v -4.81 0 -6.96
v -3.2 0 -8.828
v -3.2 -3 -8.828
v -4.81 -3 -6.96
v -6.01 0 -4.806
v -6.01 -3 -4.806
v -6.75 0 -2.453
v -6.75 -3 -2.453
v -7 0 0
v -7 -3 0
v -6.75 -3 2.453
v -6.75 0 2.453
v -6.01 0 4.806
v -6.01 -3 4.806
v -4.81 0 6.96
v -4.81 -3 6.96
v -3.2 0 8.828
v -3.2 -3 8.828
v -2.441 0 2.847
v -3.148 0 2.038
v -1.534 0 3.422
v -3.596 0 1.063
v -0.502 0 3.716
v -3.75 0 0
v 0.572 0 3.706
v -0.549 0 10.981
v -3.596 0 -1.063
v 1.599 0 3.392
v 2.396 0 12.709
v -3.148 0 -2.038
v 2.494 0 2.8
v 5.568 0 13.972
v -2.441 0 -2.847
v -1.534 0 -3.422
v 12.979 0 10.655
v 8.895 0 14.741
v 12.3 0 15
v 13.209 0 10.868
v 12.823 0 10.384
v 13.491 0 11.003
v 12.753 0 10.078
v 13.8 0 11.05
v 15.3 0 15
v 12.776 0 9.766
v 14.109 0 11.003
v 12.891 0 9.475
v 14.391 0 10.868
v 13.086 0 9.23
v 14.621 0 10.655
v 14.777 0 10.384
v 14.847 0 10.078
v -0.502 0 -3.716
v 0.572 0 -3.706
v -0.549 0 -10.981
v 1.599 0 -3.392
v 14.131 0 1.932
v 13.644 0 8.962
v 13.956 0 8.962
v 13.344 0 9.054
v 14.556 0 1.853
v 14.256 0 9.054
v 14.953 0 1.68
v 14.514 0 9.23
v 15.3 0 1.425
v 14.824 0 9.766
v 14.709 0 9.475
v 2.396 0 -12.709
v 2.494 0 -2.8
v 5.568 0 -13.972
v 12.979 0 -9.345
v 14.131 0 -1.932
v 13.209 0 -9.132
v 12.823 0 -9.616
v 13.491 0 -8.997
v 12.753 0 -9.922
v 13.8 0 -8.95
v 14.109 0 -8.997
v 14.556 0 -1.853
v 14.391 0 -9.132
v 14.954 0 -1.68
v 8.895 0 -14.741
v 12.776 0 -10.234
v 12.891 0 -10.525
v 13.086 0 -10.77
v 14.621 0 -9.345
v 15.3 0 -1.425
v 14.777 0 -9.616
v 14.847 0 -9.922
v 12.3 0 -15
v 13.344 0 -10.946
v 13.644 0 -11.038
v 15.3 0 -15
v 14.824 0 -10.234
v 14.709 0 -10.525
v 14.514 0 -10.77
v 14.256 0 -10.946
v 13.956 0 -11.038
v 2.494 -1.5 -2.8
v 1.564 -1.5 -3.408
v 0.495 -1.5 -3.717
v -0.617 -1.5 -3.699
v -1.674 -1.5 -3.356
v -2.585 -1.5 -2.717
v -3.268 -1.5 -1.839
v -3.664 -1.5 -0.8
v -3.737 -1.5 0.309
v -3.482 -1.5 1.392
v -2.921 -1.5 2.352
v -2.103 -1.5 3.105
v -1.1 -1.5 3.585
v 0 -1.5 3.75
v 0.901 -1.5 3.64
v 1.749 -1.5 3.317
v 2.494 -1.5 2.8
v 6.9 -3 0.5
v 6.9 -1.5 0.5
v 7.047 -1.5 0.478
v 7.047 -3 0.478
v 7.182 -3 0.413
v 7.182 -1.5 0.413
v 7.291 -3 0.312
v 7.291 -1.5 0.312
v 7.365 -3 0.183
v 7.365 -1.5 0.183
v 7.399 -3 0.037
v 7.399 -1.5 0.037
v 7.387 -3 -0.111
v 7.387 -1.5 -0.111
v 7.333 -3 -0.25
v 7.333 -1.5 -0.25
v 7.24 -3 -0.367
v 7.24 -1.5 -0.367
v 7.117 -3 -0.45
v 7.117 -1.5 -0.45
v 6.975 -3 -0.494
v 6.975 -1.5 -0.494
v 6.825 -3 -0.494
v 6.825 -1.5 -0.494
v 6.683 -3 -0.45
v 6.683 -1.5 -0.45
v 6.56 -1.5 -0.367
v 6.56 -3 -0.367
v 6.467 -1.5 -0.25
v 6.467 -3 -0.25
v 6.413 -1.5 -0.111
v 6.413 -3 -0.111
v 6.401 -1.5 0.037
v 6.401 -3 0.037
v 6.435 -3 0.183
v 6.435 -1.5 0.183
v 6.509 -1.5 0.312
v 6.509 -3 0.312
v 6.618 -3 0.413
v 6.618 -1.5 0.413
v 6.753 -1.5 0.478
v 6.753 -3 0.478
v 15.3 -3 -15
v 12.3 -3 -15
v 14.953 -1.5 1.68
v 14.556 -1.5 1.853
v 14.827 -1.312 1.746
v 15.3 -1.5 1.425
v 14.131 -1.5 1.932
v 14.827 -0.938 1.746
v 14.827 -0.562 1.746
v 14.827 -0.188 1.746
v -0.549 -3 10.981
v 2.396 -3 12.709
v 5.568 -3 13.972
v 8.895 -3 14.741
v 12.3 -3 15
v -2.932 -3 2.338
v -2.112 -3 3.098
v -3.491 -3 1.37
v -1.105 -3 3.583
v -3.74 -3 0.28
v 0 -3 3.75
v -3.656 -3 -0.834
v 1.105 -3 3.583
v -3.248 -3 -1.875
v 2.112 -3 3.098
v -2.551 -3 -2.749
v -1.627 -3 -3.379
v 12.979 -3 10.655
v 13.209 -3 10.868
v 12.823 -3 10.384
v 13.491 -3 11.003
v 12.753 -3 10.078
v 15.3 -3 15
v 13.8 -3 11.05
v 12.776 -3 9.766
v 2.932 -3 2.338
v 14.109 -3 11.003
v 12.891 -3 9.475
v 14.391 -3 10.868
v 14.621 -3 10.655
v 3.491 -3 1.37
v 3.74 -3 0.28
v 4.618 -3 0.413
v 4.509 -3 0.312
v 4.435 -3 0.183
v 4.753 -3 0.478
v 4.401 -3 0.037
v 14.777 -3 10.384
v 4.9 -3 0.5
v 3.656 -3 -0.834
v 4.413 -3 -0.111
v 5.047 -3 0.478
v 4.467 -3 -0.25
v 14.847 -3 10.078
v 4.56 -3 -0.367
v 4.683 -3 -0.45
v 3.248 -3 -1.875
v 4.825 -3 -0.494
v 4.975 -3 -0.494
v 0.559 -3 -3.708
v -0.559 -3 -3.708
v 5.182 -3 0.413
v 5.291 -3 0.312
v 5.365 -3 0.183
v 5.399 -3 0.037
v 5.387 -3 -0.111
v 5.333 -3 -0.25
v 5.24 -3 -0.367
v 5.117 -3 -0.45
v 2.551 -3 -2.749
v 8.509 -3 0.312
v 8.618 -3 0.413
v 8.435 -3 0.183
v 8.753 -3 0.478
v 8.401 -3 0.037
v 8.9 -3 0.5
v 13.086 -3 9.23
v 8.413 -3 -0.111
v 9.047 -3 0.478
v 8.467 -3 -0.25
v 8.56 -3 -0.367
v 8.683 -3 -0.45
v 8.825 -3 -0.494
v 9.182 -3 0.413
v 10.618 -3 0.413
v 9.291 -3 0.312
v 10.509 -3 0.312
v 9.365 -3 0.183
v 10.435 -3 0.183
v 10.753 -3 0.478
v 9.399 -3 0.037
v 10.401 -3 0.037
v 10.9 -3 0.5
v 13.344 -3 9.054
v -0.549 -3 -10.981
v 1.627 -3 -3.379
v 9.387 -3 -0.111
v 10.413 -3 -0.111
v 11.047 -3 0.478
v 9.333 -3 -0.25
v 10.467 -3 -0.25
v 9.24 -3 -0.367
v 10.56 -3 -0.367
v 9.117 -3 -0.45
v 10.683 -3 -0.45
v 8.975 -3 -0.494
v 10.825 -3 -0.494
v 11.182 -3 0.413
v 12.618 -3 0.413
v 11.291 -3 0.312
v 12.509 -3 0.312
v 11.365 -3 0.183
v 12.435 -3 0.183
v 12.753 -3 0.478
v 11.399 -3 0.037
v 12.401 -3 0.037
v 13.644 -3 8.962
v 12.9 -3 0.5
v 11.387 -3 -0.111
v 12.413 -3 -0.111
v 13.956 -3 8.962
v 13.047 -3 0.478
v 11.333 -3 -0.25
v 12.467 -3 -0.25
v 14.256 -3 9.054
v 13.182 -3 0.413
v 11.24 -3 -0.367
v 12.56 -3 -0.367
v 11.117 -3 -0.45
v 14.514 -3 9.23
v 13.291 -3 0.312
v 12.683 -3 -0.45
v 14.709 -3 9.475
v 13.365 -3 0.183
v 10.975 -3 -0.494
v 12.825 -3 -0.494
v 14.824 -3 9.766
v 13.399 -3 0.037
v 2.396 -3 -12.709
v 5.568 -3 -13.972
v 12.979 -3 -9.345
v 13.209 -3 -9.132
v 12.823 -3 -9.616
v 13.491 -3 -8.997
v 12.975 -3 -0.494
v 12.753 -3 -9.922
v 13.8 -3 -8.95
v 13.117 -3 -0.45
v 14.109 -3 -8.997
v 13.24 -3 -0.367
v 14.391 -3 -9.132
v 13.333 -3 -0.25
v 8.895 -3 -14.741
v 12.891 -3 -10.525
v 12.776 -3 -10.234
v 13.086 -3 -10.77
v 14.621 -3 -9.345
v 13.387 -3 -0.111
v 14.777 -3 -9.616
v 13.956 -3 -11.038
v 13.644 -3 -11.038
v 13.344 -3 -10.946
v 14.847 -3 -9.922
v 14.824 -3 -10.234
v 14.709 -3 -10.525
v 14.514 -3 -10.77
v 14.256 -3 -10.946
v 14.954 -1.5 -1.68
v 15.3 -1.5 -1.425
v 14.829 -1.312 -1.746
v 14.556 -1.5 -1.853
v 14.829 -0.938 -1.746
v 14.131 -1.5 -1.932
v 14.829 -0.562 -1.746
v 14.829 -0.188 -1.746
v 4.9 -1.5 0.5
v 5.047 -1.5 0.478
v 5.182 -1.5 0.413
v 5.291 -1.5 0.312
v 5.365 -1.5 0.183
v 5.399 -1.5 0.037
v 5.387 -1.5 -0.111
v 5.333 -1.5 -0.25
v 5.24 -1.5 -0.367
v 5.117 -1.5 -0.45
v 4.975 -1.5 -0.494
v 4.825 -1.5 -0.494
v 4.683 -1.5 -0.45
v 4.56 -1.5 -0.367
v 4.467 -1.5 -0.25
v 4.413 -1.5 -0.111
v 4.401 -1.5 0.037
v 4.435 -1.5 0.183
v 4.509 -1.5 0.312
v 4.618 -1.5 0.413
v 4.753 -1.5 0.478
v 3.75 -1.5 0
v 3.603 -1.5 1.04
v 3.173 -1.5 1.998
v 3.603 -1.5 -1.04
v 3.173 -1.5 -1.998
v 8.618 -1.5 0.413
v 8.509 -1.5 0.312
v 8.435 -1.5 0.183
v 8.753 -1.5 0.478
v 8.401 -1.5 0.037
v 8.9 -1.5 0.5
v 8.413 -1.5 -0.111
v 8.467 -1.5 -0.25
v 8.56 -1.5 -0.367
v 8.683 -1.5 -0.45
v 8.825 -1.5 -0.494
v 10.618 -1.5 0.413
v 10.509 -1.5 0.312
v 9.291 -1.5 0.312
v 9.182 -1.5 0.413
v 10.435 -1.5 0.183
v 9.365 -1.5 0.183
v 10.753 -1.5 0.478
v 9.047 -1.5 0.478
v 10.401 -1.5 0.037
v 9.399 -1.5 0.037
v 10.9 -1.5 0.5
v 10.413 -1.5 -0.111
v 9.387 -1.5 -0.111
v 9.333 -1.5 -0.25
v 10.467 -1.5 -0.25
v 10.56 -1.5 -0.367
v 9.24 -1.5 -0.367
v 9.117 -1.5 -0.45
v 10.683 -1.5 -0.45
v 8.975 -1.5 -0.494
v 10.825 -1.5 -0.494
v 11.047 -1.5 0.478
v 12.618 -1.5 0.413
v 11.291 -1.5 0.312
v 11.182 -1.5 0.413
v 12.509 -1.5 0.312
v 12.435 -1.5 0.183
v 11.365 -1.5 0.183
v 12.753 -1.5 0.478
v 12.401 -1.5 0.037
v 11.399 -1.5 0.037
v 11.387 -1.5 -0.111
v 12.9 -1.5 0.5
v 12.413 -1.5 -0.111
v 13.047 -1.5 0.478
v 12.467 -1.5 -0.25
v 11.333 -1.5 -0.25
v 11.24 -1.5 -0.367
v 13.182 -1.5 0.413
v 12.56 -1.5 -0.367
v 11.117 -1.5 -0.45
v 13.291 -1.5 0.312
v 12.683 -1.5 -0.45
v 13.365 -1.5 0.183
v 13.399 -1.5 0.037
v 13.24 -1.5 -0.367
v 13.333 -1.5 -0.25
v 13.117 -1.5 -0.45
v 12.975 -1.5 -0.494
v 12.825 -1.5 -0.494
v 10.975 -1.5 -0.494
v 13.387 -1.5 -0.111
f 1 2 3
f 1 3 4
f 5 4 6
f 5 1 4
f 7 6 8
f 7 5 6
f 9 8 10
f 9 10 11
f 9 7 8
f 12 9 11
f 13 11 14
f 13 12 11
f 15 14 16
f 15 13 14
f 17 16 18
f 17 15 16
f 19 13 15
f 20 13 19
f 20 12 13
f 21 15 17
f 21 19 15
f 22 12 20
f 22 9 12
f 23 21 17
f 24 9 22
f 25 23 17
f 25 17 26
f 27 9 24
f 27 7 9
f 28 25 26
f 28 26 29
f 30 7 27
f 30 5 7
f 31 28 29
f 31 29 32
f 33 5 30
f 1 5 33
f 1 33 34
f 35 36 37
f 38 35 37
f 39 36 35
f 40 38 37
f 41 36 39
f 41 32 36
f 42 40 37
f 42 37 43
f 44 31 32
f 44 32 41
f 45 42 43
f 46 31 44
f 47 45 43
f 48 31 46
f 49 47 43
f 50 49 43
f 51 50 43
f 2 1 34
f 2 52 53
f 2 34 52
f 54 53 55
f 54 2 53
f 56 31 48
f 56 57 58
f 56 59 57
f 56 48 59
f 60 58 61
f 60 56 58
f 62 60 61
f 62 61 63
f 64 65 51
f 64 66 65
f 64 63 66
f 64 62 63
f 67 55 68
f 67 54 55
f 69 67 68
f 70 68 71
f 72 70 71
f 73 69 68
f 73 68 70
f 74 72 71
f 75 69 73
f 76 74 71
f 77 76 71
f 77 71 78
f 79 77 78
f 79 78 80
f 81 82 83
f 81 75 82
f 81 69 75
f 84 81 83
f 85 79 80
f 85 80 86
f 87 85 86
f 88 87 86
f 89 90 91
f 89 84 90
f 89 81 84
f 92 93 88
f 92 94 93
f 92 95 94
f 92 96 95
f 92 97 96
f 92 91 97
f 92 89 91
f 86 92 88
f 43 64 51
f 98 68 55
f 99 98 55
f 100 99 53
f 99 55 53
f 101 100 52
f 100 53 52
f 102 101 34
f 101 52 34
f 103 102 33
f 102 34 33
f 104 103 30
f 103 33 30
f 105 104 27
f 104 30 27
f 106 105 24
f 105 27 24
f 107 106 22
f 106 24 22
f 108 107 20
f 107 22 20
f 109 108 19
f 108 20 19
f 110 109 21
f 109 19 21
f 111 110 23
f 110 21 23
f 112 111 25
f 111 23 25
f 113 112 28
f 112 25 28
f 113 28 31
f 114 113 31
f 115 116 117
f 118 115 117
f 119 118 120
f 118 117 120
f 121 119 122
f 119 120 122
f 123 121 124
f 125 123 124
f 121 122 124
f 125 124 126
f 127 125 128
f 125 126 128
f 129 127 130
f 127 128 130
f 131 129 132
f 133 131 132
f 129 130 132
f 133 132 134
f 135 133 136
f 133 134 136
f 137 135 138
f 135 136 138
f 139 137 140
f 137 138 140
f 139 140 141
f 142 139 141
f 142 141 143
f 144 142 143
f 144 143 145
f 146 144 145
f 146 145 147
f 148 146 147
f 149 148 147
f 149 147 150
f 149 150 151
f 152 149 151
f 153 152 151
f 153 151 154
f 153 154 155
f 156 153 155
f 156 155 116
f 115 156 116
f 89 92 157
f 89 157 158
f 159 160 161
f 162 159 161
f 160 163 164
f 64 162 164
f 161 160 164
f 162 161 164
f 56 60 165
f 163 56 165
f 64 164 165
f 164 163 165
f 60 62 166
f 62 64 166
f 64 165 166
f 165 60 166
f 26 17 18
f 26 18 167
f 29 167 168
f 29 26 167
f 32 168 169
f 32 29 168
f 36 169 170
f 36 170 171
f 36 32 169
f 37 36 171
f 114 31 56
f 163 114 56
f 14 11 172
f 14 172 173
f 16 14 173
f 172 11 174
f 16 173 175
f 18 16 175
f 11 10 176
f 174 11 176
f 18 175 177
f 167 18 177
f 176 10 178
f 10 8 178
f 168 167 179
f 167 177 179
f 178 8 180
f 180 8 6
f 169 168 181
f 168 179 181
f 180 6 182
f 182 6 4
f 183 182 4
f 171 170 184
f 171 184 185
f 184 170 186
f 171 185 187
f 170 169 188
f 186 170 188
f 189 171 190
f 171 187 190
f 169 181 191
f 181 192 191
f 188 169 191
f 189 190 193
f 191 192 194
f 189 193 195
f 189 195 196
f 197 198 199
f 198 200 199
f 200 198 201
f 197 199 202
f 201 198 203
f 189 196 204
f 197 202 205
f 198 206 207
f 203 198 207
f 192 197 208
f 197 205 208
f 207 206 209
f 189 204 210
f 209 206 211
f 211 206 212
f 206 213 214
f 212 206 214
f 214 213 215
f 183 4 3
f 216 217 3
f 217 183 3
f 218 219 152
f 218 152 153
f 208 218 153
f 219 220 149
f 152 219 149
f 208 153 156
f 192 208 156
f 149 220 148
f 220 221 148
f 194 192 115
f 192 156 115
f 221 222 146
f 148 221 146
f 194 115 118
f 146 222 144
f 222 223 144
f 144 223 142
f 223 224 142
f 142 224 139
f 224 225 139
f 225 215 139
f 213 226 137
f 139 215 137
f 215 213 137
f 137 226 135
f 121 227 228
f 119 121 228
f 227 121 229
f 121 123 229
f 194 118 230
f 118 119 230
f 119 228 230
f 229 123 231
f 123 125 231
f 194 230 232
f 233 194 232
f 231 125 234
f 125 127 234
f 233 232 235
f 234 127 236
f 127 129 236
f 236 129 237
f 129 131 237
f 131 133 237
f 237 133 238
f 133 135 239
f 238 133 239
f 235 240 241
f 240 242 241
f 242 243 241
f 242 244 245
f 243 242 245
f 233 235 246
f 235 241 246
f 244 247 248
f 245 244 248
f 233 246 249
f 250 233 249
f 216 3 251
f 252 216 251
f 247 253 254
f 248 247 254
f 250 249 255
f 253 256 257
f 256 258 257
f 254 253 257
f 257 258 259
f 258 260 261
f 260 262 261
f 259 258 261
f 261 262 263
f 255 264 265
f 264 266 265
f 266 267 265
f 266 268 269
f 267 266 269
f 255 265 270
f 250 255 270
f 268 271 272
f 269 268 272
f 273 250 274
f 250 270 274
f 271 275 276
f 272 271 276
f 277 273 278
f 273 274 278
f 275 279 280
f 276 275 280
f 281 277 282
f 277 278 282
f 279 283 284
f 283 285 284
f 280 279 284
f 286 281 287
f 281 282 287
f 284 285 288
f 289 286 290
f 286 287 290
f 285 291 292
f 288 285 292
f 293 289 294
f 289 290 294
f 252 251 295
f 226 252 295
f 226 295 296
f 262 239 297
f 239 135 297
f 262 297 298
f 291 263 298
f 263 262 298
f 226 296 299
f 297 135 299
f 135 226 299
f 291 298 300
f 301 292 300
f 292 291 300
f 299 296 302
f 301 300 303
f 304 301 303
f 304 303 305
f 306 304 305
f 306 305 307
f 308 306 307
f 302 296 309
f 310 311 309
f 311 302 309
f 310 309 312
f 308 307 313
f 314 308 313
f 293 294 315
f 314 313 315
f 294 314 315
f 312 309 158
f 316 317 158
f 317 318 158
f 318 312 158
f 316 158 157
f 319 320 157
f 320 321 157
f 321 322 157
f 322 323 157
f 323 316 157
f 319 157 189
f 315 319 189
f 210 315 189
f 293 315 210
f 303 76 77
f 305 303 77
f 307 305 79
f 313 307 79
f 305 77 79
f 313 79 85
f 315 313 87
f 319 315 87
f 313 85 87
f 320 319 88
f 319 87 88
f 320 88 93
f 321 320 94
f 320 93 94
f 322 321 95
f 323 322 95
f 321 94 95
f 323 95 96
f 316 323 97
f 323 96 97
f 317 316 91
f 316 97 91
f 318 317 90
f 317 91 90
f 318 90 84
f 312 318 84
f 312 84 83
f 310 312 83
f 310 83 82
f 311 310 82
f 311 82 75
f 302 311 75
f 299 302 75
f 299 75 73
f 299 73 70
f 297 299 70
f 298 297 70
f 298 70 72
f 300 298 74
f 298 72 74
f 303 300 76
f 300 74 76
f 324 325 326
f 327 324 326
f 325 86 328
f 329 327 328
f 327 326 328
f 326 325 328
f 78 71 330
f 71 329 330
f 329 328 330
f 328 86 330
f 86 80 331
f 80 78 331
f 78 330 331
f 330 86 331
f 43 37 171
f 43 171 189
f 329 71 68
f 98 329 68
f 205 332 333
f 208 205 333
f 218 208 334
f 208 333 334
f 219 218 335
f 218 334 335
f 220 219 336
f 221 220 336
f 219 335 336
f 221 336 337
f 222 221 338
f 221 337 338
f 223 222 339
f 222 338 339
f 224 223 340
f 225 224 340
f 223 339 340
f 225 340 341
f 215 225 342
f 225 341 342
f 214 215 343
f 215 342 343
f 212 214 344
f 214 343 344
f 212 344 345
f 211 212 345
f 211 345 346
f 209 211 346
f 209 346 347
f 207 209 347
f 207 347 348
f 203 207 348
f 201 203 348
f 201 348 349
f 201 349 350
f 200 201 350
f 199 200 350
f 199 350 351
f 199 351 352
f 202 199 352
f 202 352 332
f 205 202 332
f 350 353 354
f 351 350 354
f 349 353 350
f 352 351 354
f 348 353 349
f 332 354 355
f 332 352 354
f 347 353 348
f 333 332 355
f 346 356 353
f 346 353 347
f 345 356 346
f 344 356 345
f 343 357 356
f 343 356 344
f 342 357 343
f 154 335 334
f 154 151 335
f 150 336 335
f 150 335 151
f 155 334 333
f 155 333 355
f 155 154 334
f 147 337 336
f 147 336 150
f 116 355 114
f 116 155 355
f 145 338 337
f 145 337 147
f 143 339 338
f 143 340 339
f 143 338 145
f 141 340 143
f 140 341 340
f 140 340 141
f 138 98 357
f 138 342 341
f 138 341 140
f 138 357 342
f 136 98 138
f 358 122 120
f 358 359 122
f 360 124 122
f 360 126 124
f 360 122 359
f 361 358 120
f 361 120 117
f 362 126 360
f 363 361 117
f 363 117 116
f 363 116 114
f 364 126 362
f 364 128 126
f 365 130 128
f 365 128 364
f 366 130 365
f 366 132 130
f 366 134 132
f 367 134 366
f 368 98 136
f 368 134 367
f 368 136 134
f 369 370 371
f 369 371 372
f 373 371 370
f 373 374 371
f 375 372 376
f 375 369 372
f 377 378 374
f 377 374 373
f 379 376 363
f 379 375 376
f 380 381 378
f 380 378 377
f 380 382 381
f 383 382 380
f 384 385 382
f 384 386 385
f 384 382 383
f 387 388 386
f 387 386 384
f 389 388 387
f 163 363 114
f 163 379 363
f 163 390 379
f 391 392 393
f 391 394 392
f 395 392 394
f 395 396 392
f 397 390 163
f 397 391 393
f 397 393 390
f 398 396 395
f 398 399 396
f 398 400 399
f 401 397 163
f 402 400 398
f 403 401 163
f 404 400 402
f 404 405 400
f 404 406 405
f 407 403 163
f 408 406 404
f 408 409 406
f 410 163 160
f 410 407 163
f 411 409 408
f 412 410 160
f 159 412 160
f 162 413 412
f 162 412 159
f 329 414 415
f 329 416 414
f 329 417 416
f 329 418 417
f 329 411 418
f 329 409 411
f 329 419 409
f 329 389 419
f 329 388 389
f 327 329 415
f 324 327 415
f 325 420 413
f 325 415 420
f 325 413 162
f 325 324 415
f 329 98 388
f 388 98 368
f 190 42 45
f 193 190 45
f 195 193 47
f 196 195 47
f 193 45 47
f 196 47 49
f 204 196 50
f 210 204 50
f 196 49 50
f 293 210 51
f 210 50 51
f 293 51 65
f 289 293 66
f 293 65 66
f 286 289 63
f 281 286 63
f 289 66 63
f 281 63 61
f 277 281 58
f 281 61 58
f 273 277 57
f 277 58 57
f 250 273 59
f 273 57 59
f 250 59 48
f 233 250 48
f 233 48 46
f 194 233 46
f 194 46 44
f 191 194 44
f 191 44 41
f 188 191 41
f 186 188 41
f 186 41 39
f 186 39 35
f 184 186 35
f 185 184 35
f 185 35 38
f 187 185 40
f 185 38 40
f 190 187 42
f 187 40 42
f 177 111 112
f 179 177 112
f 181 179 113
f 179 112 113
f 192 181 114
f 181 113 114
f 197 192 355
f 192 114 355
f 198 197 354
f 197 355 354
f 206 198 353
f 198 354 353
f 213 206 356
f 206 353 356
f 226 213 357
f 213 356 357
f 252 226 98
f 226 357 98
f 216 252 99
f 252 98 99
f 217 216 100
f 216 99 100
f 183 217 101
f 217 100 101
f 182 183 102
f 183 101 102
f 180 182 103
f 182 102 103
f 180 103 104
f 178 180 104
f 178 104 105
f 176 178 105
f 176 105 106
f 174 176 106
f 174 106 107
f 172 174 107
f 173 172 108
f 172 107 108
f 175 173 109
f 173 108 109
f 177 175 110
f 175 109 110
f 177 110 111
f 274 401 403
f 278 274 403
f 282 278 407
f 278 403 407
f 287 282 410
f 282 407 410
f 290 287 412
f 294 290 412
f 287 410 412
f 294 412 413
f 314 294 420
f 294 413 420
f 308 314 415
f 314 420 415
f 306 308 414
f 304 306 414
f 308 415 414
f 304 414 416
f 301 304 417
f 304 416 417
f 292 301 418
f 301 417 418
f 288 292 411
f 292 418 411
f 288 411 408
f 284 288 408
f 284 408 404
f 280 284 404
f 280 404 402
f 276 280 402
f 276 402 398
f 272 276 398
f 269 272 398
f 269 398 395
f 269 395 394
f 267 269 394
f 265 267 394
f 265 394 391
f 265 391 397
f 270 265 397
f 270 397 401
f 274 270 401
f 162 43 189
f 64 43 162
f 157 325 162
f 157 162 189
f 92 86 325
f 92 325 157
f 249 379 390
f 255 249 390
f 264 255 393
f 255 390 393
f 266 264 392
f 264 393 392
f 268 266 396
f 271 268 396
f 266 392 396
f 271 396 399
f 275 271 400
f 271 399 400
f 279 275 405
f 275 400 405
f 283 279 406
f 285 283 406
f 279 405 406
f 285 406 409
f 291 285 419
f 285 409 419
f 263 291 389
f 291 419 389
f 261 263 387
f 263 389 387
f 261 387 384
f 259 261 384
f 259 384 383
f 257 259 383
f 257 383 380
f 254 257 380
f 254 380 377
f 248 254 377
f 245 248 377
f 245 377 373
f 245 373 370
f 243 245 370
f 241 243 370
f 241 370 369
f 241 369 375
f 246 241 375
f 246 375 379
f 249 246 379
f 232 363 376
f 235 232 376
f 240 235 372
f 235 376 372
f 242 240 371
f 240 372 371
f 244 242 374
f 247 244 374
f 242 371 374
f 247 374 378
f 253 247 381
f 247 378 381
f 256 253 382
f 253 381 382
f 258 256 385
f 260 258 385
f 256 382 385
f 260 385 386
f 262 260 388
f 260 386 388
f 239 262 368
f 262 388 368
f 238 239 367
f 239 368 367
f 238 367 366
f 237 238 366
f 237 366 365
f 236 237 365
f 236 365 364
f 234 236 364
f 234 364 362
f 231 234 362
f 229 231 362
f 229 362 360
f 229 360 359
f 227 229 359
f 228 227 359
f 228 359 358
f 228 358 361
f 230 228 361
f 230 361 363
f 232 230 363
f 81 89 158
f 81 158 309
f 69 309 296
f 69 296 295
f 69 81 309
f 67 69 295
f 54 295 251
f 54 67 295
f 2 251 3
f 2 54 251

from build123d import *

# Parameters (mm, degrees)
SKETCH1_R               = 1.05
SKETCH1_R_2             = 2.35
BOSS_EXTRUDE1_DEPTH     = 3
ENL_V_MAT_EXTRU_1_DEPTH = 1.5
ESQUISSE3_R             = 0.5
ESQUISSE3_R_2           = 3.75
ENL_V_MAT_EXTRU_7_DEPTH = 22.478826932


with BuildPart() as part:
    # Sketch1 → Boss-Extrude1 (new body)
    with BuildSketch(Plane(origin=(0, 0, 0), x_dir=(1, 0, 0), z_dir=(0, 1, 0))):
        with BuildLine():
            Line((15.3, 15), (12.3, 15))
            ThreePointArc((12.3, 15), (3.958234572, 13.40032808), (-3.2, 8.828273999))
            ThreePointArc((-3.2, 8.828273999), (-7, 0), (-3.2, -8.828273999))
            ThreePointArc((-3.2, -8.828273999), (3.958234572, -13.40032808), (12.3, -15))
            Line((12.3, -15), (15.3, -15))
            Line((15.3, -15), (15.3, 15))
        make_face()
        with Locations(Location((13.8, -10, 0), (0, 0, 270))):
            Circle(SKETCH1_R, mode=Mode.SUBTRACT)
        with Locations(Location((13.8, 10, 0), (0, 0, 270))):
            Circle(SKETCH1_R, mode=Mode.SUBTRACT)
        with Locations(Location((0, 0, 0), (0, 0, 270))):
            Circle(SKETCH1_R_2, mode=Mode.SUBTRACT)
    extrude(amount=-BOSS_EXTRUDE1_DEPTH)

    # Esquisse1 → Enlèv. mat.-Extru.1 (cut)
    with BuildSketch(Plane(origin=(0, 0, 0), x_dir=(1, 0, 0), z_dir=(0, 1, 0))):
        with BuildLine():
            Line((2.494493937, -2.8), (14.131406802, -1.932309126))
            add(Edge.make_bspline(
                [(14.131406802, -1.932309126), (14.497286128, -1.904835216), (14.827491954, -1.746052706), (15.157338026, -1.587443187), (15.407154881, -1.318584734), (15.656200737, -1.050556048), (15.790562016, -0.709168668), (15.92490372, -0.367831024), (15.925, 0), (15.925095847, 0.366175279), (15.791018176, 0.708007672), (15.657374187, 1.048734388), (15.407835717, 1.317851242), (15.159067388, 1.586137532), (14.828615817, 1.74551148), (14.498449498, 1.904747853), (14.131406802, 1.932309126)],
                knots=[0, 0, 0, 0.125, 0.125, 0.25, 0.25, 0.375, 0.375, 0.5, 0.5, 0.625, 0.625, 0.75, 0.75, 0.875, 0.875, 1, 1, 1], degree=2))
            Line((14.131406802, 1.932309126), (2.494493937, 2.8))
            ThreePointArc((2.494493937, 2.8), (-3.75, 0), (2.494493937, -2.8))
        make_face()
    extrude(amount=-ENL_V_MAT_EXTRU_1_DEPTH, mode=Mode.SUBTRACT)

    # Esquisse3 → Enlèv. mat.-Extru.7 (cut, through all)
    with BuildSketch(Plane(origin=(0, -1.5, 0), x_dir=(1, 0, 0), z_dir=(0, 1, 0))):
        with Locations(Location((4.9, 0, 0), (0, 0, 270))):
            Circle(ESQUISSE3_R)
        with Locations(Location((6.9, 0, 0), (0, 0, 270))):
            Circle(ESQUISSE3_R)
        with Locations(Location((8.9, 0, 0), (0, 0, 270))):
            Circle(ESQUISSE3_R)
        with Locations(Location((10.9, 0, 0), (0, 0, 270))):
            Circle(ESQUISSE3_R)
        with Locations(Location((12.9, 0, 0), (0, 0, 270))):
            Circle(ESQUISSE3_R)
        with Locations(Location((0, 0, 0), (0, 0, 270))):
            Circle(ESQUISSE3_R_2)
    extrude(amount=-ENL_V_MAT_EXTRU_7_DEPTH, mode=Mode.SUBTRACT)


solid = part.part
